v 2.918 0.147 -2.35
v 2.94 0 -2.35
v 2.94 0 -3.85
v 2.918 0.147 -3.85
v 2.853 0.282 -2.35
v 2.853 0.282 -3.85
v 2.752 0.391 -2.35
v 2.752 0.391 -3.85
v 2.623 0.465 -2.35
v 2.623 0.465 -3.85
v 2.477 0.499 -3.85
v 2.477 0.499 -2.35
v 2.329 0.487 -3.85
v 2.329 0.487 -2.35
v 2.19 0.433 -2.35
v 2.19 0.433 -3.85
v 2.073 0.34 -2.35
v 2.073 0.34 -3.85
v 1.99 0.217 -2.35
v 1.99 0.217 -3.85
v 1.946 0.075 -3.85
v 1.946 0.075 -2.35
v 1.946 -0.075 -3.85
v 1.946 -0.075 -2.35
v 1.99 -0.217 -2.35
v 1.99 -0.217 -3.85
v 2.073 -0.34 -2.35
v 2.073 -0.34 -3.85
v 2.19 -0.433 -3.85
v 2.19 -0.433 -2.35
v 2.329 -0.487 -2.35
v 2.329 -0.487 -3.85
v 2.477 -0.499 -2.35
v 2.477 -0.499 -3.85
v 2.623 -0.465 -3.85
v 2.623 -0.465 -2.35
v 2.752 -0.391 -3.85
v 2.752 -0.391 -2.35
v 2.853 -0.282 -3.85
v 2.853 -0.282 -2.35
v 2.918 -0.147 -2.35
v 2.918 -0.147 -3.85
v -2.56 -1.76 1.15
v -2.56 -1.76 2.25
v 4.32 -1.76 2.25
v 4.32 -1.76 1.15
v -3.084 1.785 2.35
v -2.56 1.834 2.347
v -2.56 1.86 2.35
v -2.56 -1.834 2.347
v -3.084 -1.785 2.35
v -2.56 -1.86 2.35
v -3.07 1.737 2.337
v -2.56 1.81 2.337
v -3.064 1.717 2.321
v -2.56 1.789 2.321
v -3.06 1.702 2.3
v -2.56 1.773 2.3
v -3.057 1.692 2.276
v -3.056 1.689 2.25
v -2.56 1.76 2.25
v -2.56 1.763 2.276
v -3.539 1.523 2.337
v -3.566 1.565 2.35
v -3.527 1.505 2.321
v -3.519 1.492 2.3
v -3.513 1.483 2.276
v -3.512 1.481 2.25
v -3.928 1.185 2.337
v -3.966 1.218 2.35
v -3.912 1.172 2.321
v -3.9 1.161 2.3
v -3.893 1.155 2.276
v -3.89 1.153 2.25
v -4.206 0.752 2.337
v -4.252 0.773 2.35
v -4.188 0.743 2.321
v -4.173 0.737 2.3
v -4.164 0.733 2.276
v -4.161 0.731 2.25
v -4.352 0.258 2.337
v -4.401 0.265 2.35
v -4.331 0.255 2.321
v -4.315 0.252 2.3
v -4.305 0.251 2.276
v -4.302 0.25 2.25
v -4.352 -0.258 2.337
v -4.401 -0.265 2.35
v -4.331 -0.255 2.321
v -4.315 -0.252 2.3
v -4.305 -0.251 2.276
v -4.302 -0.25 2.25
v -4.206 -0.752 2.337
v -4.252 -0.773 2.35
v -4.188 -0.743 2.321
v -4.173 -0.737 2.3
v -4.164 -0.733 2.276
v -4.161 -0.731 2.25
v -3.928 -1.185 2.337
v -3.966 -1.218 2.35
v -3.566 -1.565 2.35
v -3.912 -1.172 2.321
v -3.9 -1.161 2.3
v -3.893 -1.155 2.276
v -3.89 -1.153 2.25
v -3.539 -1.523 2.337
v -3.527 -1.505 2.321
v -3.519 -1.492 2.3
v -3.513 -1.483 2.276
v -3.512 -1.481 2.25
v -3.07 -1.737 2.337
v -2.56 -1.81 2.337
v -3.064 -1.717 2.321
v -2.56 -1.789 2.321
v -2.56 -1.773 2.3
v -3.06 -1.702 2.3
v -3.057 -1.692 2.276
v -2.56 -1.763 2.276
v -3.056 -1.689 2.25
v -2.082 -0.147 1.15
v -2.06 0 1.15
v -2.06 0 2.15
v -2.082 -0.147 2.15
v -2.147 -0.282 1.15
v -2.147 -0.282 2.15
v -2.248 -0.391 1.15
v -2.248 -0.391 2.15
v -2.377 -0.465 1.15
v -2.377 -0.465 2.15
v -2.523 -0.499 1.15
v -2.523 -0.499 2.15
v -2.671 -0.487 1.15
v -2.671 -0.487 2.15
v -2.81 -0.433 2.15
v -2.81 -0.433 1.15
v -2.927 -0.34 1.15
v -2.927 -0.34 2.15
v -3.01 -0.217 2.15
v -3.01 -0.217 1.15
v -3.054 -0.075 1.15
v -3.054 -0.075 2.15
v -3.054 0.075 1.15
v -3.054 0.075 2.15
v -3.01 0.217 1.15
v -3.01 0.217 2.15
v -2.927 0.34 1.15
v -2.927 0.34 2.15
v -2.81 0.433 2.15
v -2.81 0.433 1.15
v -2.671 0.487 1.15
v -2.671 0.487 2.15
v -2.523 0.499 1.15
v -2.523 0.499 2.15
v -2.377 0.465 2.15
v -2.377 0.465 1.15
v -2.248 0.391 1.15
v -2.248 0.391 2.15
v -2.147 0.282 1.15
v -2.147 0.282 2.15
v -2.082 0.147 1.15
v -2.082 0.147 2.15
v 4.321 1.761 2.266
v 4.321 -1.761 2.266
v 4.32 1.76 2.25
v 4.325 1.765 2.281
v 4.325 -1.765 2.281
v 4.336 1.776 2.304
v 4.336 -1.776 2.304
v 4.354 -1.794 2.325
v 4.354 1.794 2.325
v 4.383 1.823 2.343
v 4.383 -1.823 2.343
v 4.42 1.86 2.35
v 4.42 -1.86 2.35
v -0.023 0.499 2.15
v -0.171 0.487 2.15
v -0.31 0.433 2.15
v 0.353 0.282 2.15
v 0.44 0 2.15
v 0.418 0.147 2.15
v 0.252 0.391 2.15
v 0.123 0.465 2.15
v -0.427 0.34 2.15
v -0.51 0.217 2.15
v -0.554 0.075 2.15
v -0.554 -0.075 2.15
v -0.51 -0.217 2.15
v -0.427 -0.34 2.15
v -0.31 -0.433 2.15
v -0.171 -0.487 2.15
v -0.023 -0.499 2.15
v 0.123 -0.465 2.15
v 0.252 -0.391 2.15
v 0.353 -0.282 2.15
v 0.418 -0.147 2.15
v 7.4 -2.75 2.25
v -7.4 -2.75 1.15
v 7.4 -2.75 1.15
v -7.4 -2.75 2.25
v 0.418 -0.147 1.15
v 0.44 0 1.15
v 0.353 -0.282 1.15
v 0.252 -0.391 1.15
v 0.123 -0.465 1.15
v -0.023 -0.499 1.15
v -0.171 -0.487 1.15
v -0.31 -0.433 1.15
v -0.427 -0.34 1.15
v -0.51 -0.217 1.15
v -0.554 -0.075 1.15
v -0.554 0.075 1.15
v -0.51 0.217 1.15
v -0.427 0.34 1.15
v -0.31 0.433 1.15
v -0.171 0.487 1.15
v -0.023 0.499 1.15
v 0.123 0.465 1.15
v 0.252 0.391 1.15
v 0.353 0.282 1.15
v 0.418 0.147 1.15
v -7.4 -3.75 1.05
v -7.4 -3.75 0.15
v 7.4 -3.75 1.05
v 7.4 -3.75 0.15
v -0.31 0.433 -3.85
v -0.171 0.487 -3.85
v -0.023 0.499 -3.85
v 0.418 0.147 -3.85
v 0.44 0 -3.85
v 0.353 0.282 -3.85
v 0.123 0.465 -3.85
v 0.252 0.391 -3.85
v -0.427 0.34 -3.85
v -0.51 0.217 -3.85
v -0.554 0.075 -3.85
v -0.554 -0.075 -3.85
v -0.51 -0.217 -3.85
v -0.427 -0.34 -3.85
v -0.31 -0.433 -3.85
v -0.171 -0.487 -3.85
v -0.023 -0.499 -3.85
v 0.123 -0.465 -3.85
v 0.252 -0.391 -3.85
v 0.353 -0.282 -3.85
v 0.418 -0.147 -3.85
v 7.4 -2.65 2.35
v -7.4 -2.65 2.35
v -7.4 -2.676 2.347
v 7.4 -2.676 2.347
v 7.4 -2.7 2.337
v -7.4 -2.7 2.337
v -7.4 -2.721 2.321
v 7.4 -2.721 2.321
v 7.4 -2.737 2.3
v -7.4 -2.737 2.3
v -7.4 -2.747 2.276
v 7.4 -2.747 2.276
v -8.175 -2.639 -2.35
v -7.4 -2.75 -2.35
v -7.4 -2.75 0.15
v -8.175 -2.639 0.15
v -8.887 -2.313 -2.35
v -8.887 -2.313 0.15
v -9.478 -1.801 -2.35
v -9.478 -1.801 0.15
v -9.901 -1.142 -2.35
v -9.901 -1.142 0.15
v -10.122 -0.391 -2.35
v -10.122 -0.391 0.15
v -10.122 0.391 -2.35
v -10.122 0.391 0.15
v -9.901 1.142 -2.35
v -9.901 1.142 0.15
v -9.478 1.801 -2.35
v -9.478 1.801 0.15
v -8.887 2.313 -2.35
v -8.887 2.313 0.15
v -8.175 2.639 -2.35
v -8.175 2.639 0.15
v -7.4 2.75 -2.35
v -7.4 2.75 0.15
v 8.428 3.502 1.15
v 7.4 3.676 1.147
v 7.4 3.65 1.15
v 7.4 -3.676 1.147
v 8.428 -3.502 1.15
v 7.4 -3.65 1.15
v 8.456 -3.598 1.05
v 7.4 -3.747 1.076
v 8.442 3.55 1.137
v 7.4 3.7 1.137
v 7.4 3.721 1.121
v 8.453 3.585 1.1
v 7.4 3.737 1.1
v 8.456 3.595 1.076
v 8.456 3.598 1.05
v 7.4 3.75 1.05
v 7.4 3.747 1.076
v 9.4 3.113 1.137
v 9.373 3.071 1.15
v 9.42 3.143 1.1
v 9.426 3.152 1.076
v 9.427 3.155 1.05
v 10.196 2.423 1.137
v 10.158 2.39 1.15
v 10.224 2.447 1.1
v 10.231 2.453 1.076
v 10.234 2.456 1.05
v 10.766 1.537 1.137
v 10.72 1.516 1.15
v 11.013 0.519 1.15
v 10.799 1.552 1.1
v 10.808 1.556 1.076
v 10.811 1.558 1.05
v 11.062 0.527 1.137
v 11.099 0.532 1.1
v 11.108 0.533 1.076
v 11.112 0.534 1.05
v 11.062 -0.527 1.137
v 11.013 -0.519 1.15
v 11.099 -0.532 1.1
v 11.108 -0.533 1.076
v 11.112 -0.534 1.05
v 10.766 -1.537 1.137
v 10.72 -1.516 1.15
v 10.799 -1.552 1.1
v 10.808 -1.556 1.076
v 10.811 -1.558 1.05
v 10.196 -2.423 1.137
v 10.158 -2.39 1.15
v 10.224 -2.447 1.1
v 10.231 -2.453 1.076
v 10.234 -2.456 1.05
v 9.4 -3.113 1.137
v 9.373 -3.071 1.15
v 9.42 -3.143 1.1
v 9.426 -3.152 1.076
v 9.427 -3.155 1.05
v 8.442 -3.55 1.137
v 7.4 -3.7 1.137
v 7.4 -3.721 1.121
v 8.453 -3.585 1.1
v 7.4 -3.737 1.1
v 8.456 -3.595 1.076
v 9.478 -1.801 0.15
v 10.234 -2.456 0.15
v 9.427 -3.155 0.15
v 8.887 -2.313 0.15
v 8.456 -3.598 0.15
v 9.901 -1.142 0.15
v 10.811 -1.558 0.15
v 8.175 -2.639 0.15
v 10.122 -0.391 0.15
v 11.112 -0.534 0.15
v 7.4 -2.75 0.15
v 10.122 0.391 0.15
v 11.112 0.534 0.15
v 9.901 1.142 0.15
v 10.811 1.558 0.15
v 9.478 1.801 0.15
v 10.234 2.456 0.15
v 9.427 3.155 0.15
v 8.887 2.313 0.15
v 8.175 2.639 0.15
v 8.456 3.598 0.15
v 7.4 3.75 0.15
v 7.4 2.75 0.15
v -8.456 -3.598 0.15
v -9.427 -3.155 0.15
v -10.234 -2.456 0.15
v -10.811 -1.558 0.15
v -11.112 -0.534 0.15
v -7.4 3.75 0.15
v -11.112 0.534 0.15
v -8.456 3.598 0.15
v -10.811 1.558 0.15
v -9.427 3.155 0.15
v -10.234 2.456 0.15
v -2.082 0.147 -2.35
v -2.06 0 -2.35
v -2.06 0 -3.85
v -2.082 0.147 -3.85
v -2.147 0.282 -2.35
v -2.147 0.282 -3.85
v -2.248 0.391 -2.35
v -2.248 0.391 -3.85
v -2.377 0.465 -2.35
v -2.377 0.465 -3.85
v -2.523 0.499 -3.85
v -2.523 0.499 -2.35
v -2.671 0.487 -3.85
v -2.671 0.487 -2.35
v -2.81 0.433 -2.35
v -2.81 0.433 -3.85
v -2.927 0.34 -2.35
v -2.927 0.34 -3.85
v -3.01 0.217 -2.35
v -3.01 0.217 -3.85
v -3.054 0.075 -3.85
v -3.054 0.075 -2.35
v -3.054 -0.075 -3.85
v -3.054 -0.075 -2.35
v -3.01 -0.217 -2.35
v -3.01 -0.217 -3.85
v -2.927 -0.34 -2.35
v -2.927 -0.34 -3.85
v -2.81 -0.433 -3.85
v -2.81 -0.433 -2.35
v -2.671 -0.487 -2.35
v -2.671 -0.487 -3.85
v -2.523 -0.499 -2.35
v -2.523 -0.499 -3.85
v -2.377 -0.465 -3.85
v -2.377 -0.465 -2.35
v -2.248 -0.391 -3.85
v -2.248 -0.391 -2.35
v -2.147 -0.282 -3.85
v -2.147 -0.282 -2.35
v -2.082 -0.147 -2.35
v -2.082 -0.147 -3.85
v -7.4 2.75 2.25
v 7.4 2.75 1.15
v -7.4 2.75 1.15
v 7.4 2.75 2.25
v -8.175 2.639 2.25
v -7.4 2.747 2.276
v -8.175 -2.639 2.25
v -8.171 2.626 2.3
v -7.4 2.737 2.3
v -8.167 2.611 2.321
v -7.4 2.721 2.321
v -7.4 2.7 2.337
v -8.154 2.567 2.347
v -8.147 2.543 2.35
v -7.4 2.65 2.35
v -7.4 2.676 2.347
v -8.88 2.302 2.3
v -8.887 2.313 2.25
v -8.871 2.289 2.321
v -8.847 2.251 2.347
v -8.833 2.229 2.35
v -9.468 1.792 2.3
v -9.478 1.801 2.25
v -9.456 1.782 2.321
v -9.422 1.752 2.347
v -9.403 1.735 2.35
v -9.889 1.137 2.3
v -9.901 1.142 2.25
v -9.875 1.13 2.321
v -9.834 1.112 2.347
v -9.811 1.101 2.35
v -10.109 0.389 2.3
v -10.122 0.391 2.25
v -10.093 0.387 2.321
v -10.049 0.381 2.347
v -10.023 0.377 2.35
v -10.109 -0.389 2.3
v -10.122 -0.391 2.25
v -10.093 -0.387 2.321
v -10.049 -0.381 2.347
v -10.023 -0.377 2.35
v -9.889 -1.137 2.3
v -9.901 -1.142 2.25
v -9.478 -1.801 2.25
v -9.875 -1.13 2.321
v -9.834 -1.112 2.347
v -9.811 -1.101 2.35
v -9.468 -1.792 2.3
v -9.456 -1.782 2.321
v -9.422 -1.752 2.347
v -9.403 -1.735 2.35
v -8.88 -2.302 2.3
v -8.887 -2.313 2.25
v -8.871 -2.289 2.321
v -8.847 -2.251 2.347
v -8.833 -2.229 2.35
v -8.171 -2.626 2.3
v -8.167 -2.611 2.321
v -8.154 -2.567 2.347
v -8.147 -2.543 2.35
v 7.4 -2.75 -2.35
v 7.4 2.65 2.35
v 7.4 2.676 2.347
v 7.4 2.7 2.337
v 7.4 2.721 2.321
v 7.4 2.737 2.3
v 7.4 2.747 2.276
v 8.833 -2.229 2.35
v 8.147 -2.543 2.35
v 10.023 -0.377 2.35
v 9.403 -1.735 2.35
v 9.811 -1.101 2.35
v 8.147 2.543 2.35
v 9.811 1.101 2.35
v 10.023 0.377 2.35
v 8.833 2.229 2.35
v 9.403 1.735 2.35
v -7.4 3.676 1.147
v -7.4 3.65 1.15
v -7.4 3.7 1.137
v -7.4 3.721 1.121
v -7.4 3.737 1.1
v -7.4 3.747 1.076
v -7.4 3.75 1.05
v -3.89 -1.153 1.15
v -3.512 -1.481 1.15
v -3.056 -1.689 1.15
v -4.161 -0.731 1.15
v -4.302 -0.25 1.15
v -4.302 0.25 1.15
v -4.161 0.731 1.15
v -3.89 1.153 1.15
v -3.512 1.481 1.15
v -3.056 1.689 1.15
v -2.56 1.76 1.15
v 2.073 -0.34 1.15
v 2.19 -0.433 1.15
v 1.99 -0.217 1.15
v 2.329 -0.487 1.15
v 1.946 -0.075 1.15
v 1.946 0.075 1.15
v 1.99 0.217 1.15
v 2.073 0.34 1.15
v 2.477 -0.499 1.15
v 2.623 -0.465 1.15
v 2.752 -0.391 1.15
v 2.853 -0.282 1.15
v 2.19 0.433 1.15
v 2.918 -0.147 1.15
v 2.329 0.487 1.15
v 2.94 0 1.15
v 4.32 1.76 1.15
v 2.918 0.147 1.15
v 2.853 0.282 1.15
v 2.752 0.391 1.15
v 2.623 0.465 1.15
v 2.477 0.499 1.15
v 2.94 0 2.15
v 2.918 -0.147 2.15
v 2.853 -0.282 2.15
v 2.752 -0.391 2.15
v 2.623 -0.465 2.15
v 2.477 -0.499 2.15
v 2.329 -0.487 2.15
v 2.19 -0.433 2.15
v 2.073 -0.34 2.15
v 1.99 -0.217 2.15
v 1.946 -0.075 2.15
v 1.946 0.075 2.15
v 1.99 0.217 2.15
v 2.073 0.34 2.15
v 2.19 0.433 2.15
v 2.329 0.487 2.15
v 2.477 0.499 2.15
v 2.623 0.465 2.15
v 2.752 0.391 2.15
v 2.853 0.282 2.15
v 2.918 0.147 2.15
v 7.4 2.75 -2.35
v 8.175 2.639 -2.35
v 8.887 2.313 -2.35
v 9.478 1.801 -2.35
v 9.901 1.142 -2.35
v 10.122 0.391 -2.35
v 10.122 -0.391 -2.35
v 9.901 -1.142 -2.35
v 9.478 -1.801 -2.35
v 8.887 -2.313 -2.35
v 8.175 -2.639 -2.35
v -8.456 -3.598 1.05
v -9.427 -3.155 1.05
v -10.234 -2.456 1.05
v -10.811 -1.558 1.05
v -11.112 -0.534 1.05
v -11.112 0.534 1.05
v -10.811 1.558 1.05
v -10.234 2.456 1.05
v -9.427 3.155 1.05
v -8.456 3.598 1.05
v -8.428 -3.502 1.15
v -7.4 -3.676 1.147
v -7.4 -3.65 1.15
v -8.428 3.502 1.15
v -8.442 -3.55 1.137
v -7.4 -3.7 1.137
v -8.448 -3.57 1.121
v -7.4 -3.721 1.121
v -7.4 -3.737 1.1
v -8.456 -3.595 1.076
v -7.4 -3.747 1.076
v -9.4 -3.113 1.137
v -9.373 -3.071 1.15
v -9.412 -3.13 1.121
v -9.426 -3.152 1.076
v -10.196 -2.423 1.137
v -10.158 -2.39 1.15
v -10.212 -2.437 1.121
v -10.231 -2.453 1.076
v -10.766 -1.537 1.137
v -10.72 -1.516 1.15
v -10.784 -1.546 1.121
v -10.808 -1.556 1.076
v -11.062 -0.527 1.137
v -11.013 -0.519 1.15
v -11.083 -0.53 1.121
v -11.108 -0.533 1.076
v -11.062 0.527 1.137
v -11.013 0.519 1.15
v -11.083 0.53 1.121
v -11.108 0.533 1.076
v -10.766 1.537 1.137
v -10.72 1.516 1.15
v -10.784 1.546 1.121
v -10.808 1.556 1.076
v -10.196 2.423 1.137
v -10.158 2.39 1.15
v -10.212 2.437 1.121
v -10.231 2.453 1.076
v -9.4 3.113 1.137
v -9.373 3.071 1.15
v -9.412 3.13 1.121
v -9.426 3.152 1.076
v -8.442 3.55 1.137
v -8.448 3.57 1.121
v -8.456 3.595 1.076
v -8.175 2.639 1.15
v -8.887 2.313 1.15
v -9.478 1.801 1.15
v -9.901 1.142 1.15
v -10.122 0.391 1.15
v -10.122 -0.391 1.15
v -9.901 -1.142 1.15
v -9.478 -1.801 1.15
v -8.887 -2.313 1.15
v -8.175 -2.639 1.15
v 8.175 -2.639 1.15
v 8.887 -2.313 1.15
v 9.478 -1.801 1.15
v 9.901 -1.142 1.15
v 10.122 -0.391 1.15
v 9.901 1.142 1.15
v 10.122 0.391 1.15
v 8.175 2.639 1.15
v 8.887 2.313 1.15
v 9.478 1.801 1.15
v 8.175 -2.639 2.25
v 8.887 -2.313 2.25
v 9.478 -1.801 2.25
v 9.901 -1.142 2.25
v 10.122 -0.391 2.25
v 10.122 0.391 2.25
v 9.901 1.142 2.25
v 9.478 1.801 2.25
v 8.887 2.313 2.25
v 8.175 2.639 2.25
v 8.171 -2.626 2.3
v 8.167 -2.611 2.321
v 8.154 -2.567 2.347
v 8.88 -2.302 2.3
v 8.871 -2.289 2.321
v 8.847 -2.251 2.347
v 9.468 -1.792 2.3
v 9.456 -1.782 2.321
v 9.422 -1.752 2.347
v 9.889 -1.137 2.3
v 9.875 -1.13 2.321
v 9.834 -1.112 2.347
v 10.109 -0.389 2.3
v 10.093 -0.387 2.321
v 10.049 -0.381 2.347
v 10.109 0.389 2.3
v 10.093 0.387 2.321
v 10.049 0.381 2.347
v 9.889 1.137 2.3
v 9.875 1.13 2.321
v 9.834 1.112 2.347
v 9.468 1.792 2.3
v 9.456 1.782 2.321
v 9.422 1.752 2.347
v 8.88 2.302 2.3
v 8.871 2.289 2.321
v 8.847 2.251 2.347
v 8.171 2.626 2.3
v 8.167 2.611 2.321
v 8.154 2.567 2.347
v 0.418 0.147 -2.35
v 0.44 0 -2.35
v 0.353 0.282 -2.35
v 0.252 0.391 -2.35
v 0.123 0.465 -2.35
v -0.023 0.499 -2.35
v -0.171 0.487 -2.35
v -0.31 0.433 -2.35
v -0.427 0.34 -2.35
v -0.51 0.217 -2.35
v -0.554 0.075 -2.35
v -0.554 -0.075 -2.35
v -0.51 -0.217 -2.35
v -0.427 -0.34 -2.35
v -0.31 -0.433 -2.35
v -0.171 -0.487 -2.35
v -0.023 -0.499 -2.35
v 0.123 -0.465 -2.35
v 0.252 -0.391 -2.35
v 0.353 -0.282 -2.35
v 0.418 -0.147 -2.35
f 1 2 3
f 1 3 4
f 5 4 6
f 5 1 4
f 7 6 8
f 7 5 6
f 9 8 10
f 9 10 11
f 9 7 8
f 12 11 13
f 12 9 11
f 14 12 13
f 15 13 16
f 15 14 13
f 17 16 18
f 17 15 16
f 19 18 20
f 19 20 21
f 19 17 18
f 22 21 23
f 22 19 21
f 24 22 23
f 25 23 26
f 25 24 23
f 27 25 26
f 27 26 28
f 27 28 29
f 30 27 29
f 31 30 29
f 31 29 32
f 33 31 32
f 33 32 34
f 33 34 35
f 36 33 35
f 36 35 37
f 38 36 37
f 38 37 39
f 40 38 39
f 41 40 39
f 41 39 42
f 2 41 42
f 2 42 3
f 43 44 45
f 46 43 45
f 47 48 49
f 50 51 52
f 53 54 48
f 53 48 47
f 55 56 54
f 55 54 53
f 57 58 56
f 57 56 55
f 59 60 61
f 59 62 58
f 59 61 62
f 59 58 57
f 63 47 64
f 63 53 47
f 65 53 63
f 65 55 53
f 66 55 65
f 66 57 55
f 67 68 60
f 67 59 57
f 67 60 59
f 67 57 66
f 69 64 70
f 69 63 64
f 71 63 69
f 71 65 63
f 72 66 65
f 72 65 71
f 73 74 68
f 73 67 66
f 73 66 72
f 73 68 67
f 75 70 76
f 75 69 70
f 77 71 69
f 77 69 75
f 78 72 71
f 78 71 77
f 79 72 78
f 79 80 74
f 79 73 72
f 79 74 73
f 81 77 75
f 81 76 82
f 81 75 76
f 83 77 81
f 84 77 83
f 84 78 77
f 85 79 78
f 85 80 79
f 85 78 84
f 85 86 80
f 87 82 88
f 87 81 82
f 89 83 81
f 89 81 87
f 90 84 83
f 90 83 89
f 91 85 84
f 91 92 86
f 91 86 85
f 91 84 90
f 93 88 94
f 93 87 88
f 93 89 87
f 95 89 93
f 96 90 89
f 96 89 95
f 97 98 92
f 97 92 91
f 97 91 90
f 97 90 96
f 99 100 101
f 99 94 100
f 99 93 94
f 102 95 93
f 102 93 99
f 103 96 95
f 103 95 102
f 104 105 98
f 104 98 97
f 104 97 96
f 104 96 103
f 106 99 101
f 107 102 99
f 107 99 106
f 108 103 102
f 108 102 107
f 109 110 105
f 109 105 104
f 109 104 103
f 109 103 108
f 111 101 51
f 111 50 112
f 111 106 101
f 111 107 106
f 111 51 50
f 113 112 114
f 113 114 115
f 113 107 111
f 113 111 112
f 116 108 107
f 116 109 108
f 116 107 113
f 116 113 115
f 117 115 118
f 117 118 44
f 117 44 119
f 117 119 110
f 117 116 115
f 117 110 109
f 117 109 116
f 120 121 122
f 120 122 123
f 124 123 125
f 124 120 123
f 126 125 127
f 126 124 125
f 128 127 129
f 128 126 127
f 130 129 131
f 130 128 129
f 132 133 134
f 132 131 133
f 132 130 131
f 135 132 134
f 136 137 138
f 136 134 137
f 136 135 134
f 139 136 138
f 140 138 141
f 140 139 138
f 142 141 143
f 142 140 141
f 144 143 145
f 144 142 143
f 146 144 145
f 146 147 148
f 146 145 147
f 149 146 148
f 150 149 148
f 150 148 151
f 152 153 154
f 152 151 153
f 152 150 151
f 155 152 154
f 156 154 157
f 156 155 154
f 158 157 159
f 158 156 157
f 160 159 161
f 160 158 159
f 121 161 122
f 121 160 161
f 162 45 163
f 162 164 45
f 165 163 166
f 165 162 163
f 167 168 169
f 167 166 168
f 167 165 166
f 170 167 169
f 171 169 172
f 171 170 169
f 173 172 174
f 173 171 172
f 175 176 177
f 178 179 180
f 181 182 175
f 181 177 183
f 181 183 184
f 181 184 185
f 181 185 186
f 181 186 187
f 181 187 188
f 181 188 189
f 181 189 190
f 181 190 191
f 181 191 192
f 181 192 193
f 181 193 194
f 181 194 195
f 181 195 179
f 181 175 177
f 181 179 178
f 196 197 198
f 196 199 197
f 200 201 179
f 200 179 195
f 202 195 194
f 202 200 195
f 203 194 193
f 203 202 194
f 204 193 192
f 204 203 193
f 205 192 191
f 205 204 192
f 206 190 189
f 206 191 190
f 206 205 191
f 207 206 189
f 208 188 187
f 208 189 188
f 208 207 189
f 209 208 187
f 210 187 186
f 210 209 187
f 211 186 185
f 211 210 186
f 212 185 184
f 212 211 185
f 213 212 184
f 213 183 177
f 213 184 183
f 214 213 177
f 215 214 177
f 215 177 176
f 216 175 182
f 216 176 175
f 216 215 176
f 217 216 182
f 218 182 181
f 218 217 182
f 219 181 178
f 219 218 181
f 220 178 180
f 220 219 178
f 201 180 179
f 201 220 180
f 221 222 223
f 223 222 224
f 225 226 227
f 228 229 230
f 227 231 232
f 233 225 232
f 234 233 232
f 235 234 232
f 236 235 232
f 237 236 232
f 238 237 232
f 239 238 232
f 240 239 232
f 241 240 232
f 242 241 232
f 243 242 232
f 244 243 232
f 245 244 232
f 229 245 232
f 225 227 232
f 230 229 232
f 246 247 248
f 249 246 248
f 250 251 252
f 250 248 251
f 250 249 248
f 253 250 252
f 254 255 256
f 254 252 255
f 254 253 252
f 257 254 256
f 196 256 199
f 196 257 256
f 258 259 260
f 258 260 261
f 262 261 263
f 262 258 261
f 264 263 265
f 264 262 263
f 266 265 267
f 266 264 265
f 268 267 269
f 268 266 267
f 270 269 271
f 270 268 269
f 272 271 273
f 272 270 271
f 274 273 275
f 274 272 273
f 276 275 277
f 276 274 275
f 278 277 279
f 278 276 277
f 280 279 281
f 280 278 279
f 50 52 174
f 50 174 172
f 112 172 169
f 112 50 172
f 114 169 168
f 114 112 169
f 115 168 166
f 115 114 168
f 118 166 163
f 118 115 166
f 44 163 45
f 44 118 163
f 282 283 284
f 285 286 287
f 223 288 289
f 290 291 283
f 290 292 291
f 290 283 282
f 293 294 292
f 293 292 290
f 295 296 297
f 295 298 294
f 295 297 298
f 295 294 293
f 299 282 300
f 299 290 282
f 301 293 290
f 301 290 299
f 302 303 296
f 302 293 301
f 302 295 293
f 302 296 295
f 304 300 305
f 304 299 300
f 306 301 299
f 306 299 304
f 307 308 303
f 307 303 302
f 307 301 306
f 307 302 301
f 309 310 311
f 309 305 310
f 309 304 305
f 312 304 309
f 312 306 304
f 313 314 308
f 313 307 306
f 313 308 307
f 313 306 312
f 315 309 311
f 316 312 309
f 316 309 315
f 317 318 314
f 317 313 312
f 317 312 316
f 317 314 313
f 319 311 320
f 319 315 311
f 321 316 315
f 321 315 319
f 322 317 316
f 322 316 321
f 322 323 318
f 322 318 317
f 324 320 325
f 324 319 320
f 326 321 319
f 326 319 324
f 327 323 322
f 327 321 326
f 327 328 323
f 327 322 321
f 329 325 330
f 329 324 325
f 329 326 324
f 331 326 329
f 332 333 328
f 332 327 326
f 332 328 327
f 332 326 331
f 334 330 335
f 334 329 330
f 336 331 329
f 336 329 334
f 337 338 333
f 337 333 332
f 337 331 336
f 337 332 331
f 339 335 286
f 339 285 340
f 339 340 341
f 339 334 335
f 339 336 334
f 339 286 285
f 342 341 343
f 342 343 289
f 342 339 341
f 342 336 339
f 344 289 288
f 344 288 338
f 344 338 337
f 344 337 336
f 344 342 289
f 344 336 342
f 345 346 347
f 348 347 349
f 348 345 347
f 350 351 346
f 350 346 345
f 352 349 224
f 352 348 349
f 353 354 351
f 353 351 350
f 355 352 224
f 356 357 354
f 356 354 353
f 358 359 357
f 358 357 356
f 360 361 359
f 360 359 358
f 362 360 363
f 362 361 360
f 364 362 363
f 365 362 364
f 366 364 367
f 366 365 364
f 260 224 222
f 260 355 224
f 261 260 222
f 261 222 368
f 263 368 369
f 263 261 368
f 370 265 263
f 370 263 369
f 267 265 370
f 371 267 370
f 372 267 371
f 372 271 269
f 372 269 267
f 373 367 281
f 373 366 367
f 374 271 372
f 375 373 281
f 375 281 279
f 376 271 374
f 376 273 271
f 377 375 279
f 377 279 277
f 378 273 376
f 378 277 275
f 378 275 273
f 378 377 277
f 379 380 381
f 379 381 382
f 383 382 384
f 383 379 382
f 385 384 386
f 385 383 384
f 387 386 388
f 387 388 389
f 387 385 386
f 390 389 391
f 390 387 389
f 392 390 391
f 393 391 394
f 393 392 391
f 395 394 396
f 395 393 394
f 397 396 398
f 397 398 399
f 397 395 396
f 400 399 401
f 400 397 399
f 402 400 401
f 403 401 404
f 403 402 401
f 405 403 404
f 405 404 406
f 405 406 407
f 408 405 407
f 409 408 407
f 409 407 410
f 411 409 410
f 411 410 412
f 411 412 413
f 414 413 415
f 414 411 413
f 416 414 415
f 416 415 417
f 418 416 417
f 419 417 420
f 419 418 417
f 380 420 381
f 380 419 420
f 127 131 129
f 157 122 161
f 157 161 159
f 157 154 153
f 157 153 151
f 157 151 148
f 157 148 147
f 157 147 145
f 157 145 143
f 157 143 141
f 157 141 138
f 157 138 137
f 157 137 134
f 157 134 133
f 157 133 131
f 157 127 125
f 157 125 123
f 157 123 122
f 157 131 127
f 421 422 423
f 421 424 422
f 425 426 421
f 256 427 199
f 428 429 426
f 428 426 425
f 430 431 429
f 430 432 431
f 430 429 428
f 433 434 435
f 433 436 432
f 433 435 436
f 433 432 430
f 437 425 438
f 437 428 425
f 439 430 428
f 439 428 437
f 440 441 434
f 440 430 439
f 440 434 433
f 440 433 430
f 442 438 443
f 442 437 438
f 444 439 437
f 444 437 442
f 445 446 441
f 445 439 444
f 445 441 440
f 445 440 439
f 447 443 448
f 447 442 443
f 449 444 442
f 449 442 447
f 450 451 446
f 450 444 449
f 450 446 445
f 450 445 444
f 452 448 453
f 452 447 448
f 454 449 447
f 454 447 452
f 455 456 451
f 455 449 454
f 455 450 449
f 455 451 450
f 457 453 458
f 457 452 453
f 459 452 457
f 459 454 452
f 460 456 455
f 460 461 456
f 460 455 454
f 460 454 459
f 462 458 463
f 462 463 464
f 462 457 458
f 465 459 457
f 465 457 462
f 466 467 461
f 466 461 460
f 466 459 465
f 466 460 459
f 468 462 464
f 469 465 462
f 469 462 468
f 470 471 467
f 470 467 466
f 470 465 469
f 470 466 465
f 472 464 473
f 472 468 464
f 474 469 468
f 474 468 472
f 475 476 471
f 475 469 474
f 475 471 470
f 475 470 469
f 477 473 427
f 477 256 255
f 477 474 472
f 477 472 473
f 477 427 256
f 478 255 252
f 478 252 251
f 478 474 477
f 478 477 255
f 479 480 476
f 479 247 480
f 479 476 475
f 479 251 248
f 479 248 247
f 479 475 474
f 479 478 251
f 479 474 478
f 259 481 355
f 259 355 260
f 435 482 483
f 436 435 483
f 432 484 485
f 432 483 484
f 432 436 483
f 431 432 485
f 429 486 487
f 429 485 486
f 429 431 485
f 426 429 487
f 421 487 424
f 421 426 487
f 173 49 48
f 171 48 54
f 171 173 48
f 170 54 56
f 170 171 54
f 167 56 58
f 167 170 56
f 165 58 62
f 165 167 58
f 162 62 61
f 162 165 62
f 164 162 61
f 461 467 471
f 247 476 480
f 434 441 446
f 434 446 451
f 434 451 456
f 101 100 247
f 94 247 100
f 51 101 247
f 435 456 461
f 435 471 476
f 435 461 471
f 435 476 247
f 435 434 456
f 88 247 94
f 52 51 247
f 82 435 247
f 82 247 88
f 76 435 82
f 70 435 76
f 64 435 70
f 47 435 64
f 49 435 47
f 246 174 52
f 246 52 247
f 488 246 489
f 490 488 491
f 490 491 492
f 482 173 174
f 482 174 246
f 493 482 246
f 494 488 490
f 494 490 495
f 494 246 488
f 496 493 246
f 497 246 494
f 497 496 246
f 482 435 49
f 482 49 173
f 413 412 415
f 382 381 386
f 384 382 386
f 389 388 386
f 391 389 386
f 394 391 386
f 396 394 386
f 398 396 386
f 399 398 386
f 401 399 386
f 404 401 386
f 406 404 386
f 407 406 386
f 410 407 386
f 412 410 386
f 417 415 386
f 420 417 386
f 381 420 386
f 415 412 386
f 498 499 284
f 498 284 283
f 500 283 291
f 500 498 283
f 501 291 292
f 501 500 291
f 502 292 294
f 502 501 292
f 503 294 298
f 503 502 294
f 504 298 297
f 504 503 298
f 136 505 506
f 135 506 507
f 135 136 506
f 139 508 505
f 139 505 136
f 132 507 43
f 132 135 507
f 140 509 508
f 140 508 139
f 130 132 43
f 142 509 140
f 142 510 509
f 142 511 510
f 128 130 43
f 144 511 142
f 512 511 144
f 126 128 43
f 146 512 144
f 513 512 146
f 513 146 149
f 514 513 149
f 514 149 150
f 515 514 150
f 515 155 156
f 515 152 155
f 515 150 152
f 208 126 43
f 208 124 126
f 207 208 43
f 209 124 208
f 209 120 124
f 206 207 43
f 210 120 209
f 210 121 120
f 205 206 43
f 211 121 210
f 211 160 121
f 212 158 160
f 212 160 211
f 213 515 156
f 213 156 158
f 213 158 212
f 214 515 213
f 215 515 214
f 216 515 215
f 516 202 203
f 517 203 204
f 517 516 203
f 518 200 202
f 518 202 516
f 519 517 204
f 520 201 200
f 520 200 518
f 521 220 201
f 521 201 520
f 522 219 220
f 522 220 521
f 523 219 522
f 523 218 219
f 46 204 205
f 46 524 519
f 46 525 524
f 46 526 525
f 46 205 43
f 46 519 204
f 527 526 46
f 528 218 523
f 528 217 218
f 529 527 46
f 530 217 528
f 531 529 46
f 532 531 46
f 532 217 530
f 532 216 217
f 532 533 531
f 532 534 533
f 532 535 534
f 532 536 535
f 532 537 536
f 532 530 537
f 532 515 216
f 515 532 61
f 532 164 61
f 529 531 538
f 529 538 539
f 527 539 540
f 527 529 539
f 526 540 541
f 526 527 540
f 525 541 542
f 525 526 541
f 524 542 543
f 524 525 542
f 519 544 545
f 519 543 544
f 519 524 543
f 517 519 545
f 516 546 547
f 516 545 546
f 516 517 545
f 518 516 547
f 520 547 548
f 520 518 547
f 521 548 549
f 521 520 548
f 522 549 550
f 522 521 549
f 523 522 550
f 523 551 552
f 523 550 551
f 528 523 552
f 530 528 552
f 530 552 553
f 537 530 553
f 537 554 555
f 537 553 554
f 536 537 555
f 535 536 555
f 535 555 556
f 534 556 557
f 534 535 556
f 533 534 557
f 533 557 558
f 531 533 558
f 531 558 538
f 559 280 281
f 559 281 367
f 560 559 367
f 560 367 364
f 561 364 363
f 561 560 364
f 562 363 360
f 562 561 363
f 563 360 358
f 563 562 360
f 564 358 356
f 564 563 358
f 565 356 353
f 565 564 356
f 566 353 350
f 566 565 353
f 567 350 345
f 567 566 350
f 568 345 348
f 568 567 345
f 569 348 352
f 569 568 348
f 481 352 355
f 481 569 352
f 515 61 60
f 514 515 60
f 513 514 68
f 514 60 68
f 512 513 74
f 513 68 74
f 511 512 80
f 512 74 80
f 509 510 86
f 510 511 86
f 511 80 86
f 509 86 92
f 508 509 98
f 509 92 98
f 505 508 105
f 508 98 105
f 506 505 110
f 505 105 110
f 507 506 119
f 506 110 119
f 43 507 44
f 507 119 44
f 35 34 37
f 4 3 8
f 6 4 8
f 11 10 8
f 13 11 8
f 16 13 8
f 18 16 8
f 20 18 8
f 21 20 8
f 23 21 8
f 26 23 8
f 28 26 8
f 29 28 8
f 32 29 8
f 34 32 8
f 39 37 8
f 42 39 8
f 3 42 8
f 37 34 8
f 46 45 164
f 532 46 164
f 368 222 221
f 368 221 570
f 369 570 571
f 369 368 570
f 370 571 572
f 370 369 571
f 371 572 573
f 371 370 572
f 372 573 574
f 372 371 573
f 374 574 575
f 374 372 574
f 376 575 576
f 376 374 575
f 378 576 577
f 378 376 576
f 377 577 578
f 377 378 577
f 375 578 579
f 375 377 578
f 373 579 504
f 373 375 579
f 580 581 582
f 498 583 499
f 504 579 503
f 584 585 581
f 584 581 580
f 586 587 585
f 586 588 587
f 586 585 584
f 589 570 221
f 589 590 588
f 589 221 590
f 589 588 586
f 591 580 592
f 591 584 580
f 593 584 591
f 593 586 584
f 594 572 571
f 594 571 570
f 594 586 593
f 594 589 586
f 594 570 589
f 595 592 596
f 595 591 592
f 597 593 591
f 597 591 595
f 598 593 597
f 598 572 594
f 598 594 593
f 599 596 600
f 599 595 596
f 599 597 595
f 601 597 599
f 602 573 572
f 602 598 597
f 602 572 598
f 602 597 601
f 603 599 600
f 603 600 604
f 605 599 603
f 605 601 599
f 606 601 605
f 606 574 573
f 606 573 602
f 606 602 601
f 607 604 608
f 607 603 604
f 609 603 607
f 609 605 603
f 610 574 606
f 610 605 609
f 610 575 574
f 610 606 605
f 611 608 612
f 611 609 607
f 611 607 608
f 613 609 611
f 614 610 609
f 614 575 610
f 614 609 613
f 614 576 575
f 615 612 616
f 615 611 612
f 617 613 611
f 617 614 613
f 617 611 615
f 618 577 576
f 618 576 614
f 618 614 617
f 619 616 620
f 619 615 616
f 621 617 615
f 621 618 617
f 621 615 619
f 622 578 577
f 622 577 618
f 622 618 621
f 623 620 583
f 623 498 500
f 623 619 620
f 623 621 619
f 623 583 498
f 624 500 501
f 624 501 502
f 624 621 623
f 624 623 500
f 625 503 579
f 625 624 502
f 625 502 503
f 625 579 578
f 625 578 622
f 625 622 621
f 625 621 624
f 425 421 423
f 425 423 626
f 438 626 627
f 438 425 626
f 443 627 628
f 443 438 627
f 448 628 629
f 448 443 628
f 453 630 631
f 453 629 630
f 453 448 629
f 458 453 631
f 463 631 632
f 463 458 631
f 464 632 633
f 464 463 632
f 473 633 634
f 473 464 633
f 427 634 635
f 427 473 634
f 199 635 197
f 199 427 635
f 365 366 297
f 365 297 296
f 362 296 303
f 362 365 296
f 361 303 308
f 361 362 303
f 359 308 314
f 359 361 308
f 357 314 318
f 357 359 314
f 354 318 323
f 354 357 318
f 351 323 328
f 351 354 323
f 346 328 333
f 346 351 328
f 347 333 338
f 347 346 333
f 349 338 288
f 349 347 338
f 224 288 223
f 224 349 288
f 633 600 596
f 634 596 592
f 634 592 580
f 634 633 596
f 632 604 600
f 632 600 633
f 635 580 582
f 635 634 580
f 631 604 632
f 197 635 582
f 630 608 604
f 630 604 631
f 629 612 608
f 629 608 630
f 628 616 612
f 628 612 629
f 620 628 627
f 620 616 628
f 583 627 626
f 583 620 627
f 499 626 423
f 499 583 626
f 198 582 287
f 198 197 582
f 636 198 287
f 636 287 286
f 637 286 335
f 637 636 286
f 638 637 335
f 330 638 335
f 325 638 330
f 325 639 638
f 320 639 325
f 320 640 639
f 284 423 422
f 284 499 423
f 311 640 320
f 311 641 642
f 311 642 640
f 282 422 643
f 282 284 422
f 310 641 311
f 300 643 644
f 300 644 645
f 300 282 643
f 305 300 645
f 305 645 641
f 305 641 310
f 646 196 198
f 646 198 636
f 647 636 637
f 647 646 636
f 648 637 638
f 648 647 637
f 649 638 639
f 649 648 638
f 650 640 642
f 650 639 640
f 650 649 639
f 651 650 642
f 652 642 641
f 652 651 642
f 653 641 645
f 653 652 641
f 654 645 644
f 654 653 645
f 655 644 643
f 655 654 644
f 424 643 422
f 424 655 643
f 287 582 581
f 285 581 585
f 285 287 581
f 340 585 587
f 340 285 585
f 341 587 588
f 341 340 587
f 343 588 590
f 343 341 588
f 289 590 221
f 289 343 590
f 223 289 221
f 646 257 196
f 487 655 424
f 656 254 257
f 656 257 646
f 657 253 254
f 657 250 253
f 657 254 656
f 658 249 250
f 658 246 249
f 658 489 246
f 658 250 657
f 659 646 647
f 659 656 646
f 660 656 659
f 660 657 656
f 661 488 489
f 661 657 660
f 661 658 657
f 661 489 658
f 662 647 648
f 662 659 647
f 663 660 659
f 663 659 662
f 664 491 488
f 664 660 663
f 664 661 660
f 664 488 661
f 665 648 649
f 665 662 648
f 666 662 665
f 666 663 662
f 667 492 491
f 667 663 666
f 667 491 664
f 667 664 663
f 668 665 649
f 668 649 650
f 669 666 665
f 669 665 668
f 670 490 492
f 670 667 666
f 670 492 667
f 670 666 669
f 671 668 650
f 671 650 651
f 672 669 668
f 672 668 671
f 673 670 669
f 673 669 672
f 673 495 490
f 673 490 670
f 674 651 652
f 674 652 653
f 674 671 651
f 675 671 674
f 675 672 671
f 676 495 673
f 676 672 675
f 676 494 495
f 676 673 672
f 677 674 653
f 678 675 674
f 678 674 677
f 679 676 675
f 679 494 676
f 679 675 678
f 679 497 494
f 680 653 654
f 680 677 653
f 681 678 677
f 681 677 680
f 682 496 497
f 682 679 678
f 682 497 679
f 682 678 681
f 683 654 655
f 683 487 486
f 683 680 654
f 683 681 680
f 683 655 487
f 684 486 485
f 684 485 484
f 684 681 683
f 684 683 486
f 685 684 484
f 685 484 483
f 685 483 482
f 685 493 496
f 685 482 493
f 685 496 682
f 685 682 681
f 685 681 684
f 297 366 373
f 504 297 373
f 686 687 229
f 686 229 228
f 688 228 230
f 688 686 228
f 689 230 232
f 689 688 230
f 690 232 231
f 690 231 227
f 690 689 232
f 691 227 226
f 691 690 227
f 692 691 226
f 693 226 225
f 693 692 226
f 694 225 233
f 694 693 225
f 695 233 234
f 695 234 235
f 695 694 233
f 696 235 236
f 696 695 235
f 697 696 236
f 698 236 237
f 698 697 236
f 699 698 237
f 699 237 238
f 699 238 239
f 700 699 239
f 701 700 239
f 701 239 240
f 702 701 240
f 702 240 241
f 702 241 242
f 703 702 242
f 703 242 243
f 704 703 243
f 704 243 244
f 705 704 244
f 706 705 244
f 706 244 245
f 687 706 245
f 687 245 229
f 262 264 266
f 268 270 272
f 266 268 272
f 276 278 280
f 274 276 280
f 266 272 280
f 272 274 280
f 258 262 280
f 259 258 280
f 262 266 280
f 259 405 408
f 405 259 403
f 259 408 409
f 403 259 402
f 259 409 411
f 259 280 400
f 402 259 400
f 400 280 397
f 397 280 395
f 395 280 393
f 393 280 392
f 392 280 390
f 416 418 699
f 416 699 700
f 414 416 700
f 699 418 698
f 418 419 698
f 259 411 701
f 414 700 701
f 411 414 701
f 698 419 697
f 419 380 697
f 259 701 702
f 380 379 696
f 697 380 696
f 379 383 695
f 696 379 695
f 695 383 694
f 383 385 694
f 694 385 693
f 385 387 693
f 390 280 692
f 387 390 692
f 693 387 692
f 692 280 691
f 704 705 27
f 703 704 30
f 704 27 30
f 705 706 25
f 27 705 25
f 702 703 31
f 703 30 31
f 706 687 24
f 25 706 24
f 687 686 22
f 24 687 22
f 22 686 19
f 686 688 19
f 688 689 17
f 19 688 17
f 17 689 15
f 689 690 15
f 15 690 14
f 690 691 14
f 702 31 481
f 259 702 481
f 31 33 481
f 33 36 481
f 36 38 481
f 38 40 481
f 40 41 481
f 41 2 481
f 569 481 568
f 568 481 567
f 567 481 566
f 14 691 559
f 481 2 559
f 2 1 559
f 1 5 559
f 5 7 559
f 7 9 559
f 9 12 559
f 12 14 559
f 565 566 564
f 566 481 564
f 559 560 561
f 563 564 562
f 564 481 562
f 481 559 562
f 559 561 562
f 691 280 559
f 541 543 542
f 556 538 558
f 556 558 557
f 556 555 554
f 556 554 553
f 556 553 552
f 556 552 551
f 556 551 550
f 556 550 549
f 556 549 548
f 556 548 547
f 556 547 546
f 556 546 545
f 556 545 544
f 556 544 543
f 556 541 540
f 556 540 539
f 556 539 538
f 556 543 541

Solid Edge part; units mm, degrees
sketch "Sketch1" plane through (0, 0, 0) normal (0, 0, 1) x (1, 0, 0)
  line L0 (-7.4, -3.75) -> (7.4, -3.75)
  arc A0 (7.4, -3.75) -> (11.15, 0) centre (7.4, 0) ccw
  arc A1 (11.15, 0) -> (7.4, 3.75) centre (7.4, 0) ccw
  line L1 (7.4, 3.75) -> (-7.4, 3.75)
  arc A2 (-7.4, 3.75) -> (-11.15, 0) centre (-7.4, 0) ccw
  arc A3 (-7.4, -3.75) -> (-11.15, 0) centre (-7.4, 0) cw
  dimension "D1" = 14.8
  dimension "D2" = 7.5
extrude "Protrusion1" add sketch "Sketch1" along normal mid plane 4.7
sketch "Sketch2" plane through (0, 0, 2.35) normal (0, 0, 1) x (1, 0, 0)
  line L0 (-7.4, -2.75) -> (7.4, -2.75)
  arc A0 (7.4, -2.75) -> (10.15, 0) centre (7.4, 0) ccw
  arc A1 (10.15, 0) -> (7.4, 2.75) centre (7.4, 0) ccw
  line L1 (7.4, 2.75) -> (-7.4, 2.75)
  arc A2 (-7.4, 2.75) -> (-10.15, 0) centre (-7.4, 0) ccw
  arc A3 (-7.4, -2.75) -> (-10.15, 0) centre (-7.4, 0) cw
  dimension "D1" = 7.4
extrude "Extrusionsausschnitt_1" cut sketch "Sketch2" against normal blind 1.2 flip side to cut
sketch "Sketch3" plane through (0, 0, -2.35) normal (0, 0, -1) x (1, 0, 0)
  line L0 (-7.4, -2.75) -> (7.4, -2.75)
  arc A0 (7.4, -2.75) -> (10.15, 0) centre (7.4, 0) ccw
  arc A1 (10.15, 0) -> (7.4, 2.75) centre (7.4, 0) ccw
  line L1 (7.4, 2.75) -> (-7.4, 2.75)
  arc A2 (-7.4, 2.75) -> (-10.15, 0) centre (-7.4, 0) ccw
  arc A3 (-7.4, -2.75) -> (-10.15, 0) centre (-7.4, 0) cw
  dimension "D1" = 7.4
extrude "Extrusionsausschnitt_2" cut sketch "Sketch3" against normal blind 2.5 flip side to cut
sketch "Sketch4" plane through (0, 0, 2.35) normal (0, 0, 1) x (1, 0, 0)
  line L0 (-2.56, -1.76) -> (4.32, -1.76)
  line L1 (4.32, -1.76) -> (4.32, 1.76)
  line L2 (4.32, 1.76) -> (-2.56, 1.76)
  arc A0 (-2.56, 1.76) -> (-4.32, 0) centre (-2.56, 0) ccw
  arc A1 (-2.56, -1.76) -> (-4.32, 0) centre (-2.56, 0) cw
  dimension "D1" = 6.88
  dimension "D2" = 3.52
extrude "Extrusionsausschnitt_3" cut sketch "Sketch4" against normal blind 1.2
fillet "Verrundung_1" radius 0.1 11 edges at (0, 3.75, 1.15) (-11.15, 0, 1.15) (0, -3.75, 1.15) (0, 2.75, 2.35) (-10.15, 0, 2.35) (0, -2.75, 2.35) (10.15, 0, 2.35) (-4.32, 0, 2.35) (0.88, -1.76, 2.35) (0.88, 1.76, 2.35) (4.32, 0, 2.35)
sketch "Sketch5" plane through (0, 0, 1.15) normal (0, 0, 1) x (1, 0, 0)
  circle A0 centre (-2.56, 0) radius 0.5
  circle A1 centre (-0.06, 0) radius 0.5
  circle A2 centre (2.44, 0) radius 0.5
  dimension "D1" = 1
  dimension "D2" = 1
  dimension "D3" = 1
  dimension "D4" = 2.5
  dimension "D5" = 2.5
extrude "Extrusionsausprägung_2" add sketch "Sketch5" along normal blind 1 and the other way blind 5
